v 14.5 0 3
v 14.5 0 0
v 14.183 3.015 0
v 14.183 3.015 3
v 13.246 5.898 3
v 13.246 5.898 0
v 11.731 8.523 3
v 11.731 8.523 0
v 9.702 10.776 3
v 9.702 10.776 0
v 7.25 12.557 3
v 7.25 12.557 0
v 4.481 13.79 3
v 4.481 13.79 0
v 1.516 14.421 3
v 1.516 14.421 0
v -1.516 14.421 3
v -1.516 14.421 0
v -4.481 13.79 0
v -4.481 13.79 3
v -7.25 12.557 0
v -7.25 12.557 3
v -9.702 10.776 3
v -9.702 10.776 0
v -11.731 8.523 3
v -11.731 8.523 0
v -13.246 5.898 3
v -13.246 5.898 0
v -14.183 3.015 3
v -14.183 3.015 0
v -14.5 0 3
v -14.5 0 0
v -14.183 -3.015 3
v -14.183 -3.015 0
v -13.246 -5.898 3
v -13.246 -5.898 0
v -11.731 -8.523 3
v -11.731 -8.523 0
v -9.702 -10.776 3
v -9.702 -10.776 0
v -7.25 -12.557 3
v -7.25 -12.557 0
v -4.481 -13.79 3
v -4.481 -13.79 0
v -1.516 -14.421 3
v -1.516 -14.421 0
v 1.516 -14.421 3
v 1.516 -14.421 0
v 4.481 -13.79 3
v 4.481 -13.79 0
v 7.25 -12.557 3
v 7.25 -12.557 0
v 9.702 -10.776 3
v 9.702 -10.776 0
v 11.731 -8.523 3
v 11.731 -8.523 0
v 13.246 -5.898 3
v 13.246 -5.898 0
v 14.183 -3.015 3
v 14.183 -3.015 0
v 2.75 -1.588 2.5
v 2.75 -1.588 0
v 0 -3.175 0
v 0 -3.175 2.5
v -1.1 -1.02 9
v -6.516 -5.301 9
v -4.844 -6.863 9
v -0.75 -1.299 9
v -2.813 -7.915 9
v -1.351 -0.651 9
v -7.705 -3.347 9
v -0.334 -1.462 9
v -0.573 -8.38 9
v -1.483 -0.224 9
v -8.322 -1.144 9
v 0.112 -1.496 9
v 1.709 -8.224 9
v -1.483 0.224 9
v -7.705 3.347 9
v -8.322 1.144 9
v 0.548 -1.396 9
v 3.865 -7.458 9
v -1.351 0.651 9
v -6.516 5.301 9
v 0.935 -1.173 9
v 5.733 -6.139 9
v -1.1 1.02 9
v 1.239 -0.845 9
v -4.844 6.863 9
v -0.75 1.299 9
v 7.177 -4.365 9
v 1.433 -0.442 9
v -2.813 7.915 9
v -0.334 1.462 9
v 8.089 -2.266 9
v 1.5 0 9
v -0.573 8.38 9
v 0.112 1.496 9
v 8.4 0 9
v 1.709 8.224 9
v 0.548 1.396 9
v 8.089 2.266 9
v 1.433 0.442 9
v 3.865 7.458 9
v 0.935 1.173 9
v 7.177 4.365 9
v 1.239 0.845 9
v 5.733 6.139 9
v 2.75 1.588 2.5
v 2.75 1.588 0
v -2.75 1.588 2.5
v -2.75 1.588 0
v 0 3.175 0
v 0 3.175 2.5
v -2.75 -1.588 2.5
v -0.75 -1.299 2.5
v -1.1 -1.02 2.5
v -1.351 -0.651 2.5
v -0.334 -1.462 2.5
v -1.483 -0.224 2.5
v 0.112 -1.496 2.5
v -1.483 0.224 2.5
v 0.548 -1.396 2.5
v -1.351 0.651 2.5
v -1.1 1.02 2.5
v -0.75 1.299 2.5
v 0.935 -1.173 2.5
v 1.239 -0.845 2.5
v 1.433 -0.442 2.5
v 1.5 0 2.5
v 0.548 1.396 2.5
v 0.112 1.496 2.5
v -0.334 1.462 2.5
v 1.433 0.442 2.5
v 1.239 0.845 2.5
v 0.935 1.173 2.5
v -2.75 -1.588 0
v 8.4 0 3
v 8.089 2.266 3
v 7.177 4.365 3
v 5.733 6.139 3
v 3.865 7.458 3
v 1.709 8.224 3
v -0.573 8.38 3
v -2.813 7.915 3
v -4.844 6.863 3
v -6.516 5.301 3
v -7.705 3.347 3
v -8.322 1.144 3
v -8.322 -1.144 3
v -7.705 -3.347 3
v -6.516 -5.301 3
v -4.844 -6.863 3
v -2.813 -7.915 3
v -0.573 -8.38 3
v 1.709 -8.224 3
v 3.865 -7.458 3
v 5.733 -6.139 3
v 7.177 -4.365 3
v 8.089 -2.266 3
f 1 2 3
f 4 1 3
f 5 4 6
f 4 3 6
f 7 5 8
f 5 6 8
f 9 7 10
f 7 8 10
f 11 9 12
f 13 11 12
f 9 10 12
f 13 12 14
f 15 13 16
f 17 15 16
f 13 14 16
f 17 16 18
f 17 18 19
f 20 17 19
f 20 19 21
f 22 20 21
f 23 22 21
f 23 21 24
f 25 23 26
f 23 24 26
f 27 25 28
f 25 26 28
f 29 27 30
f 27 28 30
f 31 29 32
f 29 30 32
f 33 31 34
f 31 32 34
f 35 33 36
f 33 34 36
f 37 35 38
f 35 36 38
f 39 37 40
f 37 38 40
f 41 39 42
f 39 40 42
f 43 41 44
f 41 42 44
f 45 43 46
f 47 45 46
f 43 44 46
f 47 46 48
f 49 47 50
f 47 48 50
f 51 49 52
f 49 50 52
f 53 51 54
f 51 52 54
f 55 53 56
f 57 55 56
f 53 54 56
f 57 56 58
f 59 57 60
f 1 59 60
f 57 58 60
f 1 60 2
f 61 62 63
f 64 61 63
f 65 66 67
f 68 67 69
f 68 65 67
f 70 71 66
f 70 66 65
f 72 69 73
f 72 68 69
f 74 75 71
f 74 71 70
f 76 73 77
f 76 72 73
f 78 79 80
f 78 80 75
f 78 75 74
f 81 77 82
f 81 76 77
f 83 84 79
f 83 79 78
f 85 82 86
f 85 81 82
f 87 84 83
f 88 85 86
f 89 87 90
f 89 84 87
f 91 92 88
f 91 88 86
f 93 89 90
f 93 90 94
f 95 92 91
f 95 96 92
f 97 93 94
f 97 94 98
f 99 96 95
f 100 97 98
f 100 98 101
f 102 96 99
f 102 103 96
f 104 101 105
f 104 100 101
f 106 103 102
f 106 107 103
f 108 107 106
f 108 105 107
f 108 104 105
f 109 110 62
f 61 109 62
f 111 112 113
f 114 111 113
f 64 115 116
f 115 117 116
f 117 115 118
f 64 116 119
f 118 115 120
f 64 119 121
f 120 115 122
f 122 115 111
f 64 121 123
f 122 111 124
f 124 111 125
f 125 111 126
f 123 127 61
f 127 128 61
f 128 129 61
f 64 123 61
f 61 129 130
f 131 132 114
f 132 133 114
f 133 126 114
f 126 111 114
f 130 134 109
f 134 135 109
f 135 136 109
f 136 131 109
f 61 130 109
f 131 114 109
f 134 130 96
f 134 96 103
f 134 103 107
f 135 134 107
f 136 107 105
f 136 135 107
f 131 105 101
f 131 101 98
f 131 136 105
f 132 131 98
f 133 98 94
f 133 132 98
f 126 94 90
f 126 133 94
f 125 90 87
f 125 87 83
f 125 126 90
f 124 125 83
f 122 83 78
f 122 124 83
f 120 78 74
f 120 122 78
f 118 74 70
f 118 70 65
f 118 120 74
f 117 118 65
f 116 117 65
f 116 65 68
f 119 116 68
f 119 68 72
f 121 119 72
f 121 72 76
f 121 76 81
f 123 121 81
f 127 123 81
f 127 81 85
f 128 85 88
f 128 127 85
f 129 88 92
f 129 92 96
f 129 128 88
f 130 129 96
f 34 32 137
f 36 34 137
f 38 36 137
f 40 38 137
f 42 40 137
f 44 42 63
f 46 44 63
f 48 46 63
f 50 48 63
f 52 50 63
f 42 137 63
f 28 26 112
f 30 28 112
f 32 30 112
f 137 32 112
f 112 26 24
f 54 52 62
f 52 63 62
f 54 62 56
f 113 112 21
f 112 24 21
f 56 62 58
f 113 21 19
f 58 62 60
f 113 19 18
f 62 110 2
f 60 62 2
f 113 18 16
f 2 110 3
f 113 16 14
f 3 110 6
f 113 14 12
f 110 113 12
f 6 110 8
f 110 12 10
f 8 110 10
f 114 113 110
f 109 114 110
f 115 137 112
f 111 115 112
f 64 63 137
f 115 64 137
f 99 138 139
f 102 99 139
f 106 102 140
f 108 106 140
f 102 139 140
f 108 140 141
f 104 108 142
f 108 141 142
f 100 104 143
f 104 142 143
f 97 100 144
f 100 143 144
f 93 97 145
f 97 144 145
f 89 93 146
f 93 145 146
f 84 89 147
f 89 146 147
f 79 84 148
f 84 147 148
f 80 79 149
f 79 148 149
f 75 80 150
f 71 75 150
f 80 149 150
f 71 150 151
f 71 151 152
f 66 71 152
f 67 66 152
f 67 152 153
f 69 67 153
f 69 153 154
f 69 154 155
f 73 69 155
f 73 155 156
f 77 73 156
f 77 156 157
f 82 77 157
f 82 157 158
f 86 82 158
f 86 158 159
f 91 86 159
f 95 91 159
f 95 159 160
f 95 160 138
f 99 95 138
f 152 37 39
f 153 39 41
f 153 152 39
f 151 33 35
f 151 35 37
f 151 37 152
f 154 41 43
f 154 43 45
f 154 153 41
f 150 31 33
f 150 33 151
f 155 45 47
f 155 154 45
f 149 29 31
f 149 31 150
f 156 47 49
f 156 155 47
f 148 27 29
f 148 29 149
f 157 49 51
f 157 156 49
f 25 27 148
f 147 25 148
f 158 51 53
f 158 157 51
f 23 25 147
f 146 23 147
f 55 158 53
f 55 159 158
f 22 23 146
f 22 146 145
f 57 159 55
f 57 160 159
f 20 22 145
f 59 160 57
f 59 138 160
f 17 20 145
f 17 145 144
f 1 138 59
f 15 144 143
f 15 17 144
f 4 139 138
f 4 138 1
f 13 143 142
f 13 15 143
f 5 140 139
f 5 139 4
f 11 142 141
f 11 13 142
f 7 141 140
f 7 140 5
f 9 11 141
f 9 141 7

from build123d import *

# Parameters (mm, degrees)
F0_R     = 14.5
F0_R_2   = 8.4
F1_DEPTH = 3
F2_DEPTH = 9
F3_START = 2.5
F0_R_3   = 1.5
F3_DEPTH = 6.5


with BuildPart() as f1:
    # F0 (on Top) → F1 (new body)
    with BuildSketch(Plane.XY):
        Circle(F0_R)
        Circle(F0_R_2, mode=Mode.SUBTRACT)
    extrude(amount=F1_DEPTH)

    # F0 (on Top) → F2 (join)
    with BuildSketch(Plane.XY):
        Circle(F0_R_2)
        Polygon((-2.75, -1.5877132403), (-2.75, 1.5877132403), (0, 3.1754264805), (2.75, 1.5877132403), (2.75, -1.5877132403), (0, -3.1754264805), align=None, mode=Mode.SUBTRACT)
    extrude(amount=F2_DEPTH)

    # F0 (on Top) → F3 (join)
    with BuildSketch(Plane.XY.offset(F3_START)):
        Polygon((0, 3.1754264805), (-2.75, 1.5877132403), (-2.75, -1.5877132403), (0, -3.1754264805), (2.75, -1.5877132403), (2.75, 1.5877132403), align=None)
        Circle(F0_R_3, mode=Mode.SUBTRACT)
    extrude(amount=F3_DEPTH)


solid = f1.part
